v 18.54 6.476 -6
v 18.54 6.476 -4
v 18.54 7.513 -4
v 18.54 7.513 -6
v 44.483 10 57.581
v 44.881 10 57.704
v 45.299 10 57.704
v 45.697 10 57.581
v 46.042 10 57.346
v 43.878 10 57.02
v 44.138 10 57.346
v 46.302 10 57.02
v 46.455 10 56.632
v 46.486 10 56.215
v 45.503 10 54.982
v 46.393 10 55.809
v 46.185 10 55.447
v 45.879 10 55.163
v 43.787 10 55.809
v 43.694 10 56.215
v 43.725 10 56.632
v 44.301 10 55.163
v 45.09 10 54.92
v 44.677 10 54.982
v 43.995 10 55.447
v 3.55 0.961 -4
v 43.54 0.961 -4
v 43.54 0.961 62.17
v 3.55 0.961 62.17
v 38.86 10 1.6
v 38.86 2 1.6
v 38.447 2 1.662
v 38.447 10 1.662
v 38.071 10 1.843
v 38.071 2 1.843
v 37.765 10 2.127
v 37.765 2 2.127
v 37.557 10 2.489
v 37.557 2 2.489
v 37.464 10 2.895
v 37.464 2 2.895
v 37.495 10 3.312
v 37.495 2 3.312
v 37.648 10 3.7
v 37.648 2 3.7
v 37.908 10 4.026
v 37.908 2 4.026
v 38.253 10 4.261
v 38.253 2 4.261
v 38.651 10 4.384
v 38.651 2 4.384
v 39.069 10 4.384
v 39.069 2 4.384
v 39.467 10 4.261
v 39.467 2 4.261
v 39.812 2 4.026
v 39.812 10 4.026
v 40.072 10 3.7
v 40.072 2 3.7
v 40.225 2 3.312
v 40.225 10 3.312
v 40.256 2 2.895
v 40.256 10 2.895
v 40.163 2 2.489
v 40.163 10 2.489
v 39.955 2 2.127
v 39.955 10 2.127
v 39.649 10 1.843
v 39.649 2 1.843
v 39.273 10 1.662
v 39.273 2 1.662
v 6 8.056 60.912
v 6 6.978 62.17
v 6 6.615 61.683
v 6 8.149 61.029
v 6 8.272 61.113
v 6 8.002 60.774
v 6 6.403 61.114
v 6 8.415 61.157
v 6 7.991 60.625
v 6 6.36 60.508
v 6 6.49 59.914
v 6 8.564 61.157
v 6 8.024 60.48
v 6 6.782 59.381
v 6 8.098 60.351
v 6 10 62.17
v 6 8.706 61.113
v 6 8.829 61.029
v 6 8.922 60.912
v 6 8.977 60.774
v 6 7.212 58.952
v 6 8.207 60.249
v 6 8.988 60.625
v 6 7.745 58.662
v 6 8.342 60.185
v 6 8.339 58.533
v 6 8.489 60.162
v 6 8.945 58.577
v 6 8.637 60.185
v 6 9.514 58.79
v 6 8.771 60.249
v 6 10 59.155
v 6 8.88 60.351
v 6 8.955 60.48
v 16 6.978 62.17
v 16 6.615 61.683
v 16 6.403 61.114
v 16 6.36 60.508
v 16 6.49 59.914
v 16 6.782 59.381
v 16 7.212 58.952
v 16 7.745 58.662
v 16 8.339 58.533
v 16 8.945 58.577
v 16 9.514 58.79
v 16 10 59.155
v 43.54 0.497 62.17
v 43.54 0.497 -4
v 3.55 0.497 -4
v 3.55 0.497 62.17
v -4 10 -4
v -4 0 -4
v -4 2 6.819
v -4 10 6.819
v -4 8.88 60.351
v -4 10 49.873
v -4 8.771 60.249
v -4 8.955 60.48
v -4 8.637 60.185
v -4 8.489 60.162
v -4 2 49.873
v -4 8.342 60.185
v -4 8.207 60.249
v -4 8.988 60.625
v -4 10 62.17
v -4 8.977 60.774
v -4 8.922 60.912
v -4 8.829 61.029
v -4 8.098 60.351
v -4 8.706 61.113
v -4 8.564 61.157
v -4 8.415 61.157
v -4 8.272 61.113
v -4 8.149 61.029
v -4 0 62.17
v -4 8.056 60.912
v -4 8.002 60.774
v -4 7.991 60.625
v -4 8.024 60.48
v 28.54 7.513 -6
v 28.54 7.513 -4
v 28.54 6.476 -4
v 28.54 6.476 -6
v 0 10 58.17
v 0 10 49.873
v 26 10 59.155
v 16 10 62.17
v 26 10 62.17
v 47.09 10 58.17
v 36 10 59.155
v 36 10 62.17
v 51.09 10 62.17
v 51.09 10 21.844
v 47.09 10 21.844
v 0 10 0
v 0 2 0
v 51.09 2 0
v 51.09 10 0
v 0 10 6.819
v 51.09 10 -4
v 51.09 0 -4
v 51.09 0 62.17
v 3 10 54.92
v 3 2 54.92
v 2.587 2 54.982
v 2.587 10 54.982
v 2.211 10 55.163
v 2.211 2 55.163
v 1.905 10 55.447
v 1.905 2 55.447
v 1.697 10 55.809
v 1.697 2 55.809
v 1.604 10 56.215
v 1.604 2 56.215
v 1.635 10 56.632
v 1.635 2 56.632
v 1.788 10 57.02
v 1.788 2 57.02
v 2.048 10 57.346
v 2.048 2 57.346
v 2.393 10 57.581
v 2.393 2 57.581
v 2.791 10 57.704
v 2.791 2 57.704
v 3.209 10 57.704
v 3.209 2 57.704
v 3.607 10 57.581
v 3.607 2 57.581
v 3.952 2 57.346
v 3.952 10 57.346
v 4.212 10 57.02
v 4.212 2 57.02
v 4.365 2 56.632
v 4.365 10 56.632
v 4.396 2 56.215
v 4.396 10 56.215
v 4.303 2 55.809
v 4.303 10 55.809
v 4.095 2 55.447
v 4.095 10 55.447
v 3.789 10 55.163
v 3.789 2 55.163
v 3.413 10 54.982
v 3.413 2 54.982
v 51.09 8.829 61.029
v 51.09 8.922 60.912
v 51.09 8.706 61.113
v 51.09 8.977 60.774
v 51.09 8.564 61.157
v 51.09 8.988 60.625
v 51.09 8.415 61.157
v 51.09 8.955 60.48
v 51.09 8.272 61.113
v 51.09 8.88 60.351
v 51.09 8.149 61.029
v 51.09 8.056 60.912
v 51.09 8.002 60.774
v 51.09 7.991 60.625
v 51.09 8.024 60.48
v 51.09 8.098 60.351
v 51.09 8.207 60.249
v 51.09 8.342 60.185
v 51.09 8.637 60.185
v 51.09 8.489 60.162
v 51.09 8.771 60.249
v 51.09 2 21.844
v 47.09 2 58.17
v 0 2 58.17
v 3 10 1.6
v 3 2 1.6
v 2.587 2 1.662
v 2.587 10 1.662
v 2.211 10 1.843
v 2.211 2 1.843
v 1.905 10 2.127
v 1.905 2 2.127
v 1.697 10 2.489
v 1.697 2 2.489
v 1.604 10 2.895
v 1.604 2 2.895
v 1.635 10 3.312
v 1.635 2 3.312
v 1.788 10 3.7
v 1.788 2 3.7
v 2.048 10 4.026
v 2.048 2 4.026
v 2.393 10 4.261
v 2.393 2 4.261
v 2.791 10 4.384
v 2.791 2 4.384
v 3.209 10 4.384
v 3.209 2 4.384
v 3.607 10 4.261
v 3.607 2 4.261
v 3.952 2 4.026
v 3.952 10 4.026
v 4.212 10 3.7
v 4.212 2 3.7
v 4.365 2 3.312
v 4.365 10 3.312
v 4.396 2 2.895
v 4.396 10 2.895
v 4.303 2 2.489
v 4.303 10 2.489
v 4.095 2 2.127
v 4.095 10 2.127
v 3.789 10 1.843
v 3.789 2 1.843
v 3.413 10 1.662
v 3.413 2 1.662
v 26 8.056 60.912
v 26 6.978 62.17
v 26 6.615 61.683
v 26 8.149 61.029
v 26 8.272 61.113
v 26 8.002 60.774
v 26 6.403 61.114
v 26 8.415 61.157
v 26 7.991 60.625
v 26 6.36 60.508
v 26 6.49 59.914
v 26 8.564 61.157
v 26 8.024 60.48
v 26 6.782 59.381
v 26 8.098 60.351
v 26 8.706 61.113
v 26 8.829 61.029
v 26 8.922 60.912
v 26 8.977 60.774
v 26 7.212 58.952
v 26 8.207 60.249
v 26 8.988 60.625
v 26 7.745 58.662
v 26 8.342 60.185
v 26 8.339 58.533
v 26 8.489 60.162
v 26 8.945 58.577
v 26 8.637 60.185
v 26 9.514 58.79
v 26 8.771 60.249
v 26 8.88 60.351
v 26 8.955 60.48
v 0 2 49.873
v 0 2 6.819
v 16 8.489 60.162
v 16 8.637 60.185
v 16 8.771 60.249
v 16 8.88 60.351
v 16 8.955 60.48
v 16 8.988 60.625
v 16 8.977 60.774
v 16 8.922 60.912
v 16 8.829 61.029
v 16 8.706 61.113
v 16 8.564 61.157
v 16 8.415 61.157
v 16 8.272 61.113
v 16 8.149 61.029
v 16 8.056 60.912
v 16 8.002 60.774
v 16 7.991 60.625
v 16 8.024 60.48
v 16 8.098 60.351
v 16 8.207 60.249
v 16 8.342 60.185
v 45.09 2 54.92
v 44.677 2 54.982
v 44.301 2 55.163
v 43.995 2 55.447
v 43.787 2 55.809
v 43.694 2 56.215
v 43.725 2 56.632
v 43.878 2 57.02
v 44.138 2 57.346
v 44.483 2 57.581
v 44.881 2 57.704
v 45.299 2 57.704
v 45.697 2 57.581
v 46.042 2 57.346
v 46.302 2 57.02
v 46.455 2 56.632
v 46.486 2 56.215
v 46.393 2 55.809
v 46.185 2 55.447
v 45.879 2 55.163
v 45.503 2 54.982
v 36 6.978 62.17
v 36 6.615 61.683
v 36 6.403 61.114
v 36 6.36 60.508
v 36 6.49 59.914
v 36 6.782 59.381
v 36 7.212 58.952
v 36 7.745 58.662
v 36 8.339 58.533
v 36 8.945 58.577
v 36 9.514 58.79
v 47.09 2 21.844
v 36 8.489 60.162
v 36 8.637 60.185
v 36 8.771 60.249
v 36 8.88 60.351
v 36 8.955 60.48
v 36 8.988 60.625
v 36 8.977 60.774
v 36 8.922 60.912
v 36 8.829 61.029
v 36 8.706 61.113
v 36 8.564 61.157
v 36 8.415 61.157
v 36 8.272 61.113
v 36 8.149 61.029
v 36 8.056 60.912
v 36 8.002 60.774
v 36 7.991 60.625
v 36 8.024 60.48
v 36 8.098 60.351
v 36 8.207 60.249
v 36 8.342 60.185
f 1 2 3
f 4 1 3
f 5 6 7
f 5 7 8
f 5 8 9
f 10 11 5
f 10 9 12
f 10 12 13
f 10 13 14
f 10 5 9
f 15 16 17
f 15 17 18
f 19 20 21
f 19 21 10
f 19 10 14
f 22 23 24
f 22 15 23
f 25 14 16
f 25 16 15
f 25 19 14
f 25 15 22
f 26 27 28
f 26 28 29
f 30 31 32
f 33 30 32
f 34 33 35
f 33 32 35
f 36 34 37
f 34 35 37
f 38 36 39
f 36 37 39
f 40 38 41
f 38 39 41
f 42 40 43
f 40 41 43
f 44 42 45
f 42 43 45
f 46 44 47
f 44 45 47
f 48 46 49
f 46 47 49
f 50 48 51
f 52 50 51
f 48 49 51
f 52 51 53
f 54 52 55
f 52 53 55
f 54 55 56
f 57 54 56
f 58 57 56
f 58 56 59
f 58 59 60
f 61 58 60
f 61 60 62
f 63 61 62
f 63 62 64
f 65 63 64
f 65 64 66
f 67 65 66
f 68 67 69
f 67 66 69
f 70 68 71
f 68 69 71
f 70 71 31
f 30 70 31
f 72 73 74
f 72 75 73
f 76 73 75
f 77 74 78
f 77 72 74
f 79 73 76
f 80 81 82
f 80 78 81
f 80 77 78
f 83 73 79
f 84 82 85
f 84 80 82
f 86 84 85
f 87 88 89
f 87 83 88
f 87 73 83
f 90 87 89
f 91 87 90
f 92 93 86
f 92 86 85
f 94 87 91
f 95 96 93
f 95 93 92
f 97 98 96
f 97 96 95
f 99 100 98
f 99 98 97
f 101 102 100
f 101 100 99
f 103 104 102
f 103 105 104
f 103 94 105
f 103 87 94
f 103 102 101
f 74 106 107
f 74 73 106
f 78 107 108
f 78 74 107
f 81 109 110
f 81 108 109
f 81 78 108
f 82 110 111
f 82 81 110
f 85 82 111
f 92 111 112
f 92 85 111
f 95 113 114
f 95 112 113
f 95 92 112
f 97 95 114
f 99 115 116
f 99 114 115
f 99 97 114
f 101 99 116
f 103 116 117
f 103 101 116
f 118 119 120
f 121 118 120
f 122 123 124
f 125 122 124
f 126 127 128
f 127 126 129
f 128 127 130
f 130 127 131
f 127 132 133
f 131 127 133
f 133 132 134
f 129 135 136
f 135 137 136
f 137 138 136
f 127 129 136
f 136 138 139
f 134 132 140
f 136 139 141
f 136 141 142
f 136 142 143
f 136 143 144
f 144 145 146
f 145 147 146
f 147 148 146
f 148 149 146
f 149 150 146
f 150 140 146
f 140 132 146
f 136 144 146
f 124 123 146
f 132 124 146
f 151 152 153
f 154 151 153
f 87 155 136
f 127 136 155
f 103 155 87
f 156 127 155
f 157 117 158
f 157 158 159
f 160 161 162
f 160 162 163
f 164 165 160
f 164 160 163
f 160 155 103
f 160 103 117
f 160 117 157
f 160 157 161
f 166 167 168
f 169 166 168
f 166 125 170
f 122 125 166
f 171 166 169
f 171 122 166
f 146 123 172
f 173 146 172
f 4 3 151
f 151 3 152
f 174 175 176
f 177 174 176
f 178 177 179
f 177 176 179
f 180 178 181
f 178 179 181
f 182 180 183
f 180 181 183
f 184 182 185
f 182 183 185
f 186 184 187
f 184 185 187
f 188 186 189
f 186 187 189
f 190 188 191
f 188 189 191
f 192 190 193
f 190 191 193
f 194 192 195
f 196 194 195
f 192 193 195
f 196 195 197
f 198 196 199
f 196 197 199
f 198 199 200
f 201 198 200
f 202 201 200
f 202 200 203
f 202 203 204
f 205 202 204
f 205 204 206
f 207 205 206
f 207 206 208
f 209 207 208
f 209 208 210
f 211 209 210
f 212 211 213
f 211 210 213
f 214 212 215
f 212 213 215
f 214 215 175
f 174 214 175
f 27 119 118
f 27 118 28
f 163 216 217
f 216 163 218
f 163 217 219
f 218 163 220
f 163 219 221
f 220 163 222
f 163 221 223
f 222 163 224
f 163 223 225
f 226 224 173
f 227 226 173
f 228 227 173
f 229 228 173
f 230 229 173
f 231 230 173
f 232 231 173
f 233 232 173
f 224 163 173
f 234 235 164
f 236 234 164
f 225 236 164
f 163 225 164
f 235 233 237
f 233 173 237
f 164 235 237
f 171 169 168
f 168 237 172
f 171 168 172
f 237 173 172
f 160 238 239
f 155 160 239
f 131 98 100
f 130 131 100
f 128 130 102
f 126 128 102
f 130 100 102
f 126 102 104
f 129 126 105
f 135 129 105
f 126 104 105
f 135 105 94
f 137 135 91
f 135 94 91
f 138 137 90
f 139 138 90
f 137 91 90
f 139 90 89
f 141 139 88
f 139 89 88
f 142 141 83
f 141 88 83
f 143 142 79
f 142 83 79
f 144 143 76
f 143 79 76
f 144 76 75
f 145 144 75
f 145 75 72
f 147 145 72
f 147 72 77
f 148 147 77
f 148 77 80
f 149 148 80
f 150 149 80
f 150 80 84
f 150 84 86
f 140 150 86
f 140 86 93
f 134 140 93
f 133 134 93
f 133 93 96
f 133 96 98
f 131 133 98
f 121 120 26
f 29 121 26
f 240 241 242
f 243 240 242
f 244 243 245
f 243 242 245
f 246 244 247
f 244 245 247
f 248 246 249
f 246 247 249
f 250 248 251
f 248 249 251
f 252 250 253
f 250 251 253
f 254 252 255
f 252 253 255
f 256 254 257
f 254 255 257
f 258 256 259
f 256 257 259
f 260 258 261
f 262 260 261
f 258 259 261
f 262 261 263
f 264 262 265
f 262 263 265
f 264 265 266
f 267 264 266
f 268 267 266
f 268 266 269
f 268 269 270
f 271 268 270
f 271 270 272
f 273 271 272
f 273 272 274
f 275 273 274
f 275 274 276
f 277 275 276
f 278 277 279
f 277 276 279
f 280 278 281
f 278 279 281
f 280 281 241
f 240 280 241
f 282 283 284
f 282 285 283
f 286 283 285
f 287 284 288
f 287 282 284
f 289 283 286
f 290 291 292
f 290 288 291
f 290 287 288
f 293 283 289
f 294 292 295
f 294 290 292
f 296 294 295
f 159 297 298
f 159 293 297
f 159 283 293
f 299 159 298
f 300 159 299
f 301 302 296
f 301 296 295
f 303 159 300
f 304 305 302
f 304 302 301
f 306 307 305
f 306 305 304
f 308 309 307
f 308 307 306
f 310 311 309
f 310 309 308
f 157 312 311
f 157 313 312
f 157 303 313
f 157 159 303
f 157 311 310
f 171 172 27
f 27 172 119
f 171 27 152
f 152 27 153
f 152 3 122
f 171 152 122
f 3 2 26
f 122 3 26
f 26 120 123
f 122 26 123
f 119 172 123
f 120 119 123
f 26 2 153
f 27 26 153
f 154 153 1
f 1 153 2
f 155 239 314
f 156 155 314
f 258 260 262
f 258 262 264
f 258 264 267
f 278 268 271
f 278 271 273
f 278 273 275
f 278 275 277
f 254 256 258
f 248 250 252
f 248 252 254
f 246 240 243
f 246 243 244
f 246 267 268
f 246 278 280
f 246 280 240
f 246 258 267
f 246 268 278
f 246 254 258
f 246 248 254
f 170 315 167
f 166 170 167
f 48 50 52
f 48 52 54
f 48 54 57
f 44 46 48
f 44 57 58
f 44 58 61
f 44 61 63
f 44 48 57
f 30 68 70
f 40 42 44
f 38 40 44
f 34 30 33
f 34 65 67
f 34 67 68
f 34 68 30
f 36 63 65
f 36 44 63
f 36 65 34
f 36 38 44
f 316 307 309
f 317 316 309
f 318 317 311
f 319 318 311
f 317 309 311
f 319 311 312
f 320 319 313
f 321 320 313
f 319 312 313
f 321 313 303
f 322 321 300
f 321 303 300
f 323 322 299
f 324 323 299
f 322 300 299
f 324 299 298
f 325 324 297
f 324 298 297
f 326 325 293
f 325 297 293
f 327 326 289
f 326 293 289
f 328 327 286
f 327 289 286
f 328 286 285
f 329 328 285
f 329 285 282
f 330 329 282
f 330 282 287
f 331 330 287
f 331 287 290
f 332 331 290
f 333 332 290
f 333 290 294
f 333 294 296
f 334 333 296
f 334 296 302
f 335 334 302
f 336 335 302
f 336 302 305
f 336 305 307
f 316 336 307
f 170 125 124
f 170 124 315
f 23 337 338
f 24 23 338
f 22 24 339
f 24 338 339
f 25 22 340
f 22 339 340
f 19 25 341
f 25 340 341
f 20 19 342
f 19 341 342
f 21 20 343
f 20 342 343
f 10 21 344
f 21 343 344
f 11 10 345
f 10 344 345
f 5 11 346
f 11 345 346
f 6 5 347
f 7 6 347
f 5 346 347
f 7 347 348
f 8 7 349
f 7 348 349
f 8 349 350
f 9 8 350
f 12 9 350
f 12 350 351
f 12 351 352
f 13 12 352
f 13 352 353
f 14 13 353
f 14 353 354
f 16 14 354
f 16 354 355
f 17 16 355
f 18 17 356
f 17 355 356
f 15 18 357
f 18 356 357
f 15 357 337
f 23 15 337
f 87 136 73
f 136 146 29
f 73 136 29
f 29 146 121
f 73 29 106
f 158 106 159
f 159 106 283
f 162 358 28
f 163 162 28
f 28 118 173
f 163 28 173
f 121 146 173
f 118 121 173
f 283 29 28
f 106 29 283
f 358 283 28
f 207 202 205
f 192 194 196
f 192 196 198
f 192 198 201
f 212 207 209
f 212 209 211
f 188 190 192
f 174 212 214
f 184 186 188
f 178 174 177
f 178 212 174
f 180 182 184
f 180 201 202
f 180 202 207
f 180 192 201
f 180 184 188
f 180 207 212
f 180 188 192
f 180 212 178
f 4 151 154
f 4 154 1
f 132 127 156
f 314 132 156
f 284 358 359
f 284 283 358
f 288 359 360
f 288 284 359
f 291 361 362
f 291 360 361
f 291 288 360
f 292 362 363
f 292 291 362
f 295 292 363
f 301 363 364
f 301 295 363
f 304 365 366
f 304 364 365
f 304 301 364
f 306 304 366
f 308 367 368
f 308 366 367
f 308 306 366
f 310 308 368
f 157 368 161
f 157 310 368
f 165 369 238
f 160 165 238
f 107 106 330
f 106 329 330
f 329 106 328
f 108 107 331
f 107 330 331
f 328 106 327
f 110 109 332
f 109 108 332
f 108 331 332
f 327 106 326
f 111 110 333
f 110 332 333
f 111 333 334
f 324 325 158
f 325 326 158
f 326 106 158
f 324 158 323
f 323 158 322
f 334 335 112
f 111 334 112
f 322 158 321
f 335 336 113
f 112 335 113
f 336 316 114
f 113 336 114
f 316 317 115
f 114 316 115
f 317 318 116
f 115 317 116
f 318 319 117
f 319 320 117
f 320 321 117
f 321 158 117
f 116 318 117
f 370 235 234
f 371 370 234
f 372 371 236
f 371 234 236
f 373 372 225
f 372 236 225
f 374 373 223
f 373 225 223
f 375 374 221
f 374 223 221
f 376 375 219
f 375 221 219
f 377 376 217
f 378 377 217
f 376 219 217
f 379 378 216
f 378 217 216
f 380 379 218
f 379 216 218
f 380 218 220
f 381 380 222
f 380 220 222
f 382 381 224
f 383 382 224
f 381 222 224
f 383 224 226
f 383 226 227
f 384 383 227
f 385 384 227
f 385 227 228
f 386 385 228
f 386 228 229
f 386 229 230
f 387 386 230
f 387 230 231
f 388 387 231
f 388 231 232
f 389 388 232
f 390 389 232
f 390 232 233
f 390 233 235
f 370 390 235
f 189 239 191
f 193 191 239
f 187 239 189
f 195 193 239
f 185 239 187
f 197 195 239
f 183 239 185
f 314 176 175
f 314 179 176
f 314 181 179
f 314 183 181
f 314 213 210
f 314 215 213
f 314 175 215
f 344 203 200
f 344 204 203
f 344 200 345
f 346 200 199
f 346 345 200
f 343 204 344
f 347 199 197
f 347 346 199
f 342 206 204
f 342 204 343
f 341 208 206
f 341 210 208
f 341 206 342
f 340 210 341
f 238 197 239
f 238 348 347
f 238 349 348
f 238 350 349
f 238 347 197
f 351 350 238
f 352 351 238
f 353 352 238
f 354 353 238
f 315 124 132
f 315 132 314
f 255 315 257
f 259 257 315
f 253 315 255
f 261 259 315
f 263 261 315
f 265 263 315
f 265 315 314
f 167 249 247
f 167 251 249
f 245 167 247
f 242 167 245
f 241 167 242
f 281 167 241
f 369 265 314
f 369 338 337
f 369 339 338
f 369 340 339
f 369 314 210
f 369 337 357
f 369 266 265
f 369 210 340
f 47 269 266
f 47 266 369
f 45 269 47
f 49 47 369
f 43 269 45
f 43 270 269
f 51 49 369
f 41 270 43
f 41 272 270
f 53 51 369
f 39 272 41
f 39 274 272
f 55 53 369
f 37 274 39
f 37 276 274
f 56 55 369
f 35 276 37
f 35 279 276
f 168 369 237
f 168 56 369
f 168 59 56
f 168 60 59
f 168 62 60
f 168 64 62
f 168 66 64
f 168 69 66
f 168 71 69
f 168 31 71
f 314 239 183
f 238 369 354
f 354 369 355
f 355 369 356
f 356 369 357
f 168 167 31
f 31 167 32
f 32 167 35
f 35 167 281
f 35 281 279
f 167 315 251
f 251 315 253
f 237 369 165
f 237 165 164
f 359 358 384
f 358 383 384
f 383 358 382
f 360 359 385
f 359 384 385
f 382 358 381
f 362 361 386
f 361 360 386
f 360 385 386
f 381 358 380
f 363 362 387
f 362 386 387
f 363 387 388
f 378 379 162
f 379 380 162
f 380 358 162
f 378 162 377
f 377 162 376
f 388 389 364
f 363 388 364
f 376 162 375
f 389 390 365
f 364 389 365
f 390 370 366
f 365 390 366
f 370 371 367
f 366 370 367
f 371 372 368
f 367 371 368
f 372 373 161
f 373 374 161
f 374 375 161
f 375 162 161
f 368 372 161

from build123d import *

# Parameters (mm, degrees)
SKETCH1_W           = 47.09
SKETCH1_H           = 58.17
BOSS_EXTRUDE1_DEPTH = 2
SKETCH2_R           = 1.4
BOSS_EXTRUDE2_DEPTH = 8
BOSS_EXTRUDE3_DEPTH = 10
SKETCH6_W           = 4.055357108
SKETCH6_H           = 43.053811849
SKETCH6_W_2         = 4
SKETCH6_H_2         = 21.843851608
CUT_EXTRUDE2_DEPTH  = 8
SKETCH8_R           = 0.5
CUT_EXTRUDE3_DEPTH  = 84.666104248
SKETCH10_R          = 2.134407384
CUT_EXTRUDE4_DEPTH  = 10
SKETCH11_R          = 2.134407384
CUT_EXTRUDE5_DEPTH  = 10
BOSS_EXTRUDE4_DEPTH = 2
SKETCH13_W          = 39.99
SKETCH13_H          = 0.463806664
CUT_EXTRUDE6_DEPTH  = 85.194162505


with BuildPart() as part:
    # Sketch1 → Boss-Extrude1 (new body)
    with BuildSketch(Plane(origin=(0, 0, 0), x_dir=(1, 0, 0), z_dir=(0, 1, 0))):
        with Locations((23.545, -29.085)):
            Rectangle(SKETCH1_W, SKETCH1_H)
    extrude(amount=BOSS_EXTRUDE1_DEPTH)

    # Sketch2 → Boss-Extrude2 (add)
    with BuildSketch(Plane(origin=(0, 2, 0), x_dir=(1, 0, 0), z_dir=(0, 1, 0))):
        with Locations(Location((38.86, -3, 0), (0, 0, 90))):
            Circle(SKETCH2_R)
        with Locations(Location((45.09, -56.32, 0), (0, 0, 90))):
            Circle(SKETCH2_R)
        with Locations(Location((3, -56.32, 0), (0, 0, 90))):
            Circle(SKETCH2_R)
        with Locations(Location((3, -3, 0), (0, 0, 90))):
            Circle(SKETCH2_R)
    extrude(amount=BOSS_EXTRUDE2_DEPTH)

    # Sketch3 → Boss-Extrude3 (add)
    with BuildSketch(Plane(origin=(0, 0, 0), x_dir=(1, 0, 0), z_dir=(0, 1, 0))):
        Polygon((0, -26.469922438), (0, 0), (23.66505447, 0), (23.66505447, 4), (-4, 4), (-4, -26.469922438), align=None)
        Polygon((23.66505447, 4), (23.66505447, 0), (47.09, 0), (47.09, -29.085), (51.09, -29.085), (51.09, 4), align=None)
        Polygon((47.09, -58.17), (23.66505447, -58.17), (23.66505447, -62.17), (51.09, -62.17), (51.09, -29.085), (47.09, -29.085), align=None)
        Polygon((0, -58.17), (0, -26.469922438), (-4, -26.469922438), (-4, -62.17), (23.66505447, -62.17), (23.66505447, -58.17), align=None)
    extrude(amount=BOSS_EXTRUDE3_DEPTH)

    # Sketch6 → Cut-Extrude2 (cut)
    with BuildSketch(Plane(origin=(0, 10, 0), x_dir=(1, 0, 0), z_dir=(0, 1, 0))):
        with Locations((-1.972321446, -28.345718343)):
            Rectangle(SKETCH6_W, SKETCH6_H)
        with Locations((49.09, -10.921925804)):
            Rectangle(SKETCH6_W_2, SKETCH6_H_2)
    extrude(amount=-CUT_EXTRUDE2_DEPTH, mode=Mode.SUBTRACT)

    # Sketch8 → Cut-Extrude3 (cut, through all)
    with BuildSketch(Plane(origin=(51.09, 0, 0), x_dir=(0, 0, -1), z_dir=(1, 0, 0))):
        with Locations((-60.66237095, 8.489122927)):
            Circle(SKETCH8_R)
    extrude(amount=-CUT_EXTRUDE3_DEPTH, mode=Mode.SUBTRACT)

    # Sketch10 → Cut-Extrude4 (cut)
    with BuildSketch(Plane(origin=(6, 10, 62.17), x_dir=(0, 0, -1), z_dir=(1, 0, 0))):
        with Locations((1.50762905, -1.510877073)):
            Circle(SKETCH10_R)
    extrude(amount=CUT_EXTRUDE4_DEPTH, mode=Mode.SUBTRACT)

    # Sketch11 → Cut-Extrude5 (cut)
    with BuildSketch(Plane(origin=(26, 10, 62.17), x_dir=(0, 0, -1), z_dir=(1, 0, 0))):
        with Locations((1.50762905, -1.510877073)):
            Circle(SKETCH11_R)
    extrude(amount=CUT_EXTRUDE5_DEPTH, mode=Mode.SUBTRACT)

    # Sketch12 → Boss-Extrude4 (add)
    with BuildSketch(Plane(origin=(0, 0, -4), x_dir=(-1, 0, 0), z_dir=(0, 0, -1))):
        Polygon((-23.54, 7.513197032), (-28.54, 7.513197032), (-28.54, 6.476270602), (-18.54, 6.476270602), (-18.54, 7.513197032), align=None)
    extrude(amount=BOSS_EXTRUDE4_DEPTH)

    # Sketch13 → Cut-Extrude6 (cut, through all)
    with BuildSketch(Plane(origin=(0, 0, -4), x_dir=(-1, 0, 0), z_dir=(0, 0, -1))):
        with Locations((-23.545, 0.728666672)):
            Rectangle(SKETCH13_W, SKETCH13_H)
    extrude(amount=-CUT_EXTRUDE6_DEPTH, mode=Mode.SUBTRACT)


solid = part.part
